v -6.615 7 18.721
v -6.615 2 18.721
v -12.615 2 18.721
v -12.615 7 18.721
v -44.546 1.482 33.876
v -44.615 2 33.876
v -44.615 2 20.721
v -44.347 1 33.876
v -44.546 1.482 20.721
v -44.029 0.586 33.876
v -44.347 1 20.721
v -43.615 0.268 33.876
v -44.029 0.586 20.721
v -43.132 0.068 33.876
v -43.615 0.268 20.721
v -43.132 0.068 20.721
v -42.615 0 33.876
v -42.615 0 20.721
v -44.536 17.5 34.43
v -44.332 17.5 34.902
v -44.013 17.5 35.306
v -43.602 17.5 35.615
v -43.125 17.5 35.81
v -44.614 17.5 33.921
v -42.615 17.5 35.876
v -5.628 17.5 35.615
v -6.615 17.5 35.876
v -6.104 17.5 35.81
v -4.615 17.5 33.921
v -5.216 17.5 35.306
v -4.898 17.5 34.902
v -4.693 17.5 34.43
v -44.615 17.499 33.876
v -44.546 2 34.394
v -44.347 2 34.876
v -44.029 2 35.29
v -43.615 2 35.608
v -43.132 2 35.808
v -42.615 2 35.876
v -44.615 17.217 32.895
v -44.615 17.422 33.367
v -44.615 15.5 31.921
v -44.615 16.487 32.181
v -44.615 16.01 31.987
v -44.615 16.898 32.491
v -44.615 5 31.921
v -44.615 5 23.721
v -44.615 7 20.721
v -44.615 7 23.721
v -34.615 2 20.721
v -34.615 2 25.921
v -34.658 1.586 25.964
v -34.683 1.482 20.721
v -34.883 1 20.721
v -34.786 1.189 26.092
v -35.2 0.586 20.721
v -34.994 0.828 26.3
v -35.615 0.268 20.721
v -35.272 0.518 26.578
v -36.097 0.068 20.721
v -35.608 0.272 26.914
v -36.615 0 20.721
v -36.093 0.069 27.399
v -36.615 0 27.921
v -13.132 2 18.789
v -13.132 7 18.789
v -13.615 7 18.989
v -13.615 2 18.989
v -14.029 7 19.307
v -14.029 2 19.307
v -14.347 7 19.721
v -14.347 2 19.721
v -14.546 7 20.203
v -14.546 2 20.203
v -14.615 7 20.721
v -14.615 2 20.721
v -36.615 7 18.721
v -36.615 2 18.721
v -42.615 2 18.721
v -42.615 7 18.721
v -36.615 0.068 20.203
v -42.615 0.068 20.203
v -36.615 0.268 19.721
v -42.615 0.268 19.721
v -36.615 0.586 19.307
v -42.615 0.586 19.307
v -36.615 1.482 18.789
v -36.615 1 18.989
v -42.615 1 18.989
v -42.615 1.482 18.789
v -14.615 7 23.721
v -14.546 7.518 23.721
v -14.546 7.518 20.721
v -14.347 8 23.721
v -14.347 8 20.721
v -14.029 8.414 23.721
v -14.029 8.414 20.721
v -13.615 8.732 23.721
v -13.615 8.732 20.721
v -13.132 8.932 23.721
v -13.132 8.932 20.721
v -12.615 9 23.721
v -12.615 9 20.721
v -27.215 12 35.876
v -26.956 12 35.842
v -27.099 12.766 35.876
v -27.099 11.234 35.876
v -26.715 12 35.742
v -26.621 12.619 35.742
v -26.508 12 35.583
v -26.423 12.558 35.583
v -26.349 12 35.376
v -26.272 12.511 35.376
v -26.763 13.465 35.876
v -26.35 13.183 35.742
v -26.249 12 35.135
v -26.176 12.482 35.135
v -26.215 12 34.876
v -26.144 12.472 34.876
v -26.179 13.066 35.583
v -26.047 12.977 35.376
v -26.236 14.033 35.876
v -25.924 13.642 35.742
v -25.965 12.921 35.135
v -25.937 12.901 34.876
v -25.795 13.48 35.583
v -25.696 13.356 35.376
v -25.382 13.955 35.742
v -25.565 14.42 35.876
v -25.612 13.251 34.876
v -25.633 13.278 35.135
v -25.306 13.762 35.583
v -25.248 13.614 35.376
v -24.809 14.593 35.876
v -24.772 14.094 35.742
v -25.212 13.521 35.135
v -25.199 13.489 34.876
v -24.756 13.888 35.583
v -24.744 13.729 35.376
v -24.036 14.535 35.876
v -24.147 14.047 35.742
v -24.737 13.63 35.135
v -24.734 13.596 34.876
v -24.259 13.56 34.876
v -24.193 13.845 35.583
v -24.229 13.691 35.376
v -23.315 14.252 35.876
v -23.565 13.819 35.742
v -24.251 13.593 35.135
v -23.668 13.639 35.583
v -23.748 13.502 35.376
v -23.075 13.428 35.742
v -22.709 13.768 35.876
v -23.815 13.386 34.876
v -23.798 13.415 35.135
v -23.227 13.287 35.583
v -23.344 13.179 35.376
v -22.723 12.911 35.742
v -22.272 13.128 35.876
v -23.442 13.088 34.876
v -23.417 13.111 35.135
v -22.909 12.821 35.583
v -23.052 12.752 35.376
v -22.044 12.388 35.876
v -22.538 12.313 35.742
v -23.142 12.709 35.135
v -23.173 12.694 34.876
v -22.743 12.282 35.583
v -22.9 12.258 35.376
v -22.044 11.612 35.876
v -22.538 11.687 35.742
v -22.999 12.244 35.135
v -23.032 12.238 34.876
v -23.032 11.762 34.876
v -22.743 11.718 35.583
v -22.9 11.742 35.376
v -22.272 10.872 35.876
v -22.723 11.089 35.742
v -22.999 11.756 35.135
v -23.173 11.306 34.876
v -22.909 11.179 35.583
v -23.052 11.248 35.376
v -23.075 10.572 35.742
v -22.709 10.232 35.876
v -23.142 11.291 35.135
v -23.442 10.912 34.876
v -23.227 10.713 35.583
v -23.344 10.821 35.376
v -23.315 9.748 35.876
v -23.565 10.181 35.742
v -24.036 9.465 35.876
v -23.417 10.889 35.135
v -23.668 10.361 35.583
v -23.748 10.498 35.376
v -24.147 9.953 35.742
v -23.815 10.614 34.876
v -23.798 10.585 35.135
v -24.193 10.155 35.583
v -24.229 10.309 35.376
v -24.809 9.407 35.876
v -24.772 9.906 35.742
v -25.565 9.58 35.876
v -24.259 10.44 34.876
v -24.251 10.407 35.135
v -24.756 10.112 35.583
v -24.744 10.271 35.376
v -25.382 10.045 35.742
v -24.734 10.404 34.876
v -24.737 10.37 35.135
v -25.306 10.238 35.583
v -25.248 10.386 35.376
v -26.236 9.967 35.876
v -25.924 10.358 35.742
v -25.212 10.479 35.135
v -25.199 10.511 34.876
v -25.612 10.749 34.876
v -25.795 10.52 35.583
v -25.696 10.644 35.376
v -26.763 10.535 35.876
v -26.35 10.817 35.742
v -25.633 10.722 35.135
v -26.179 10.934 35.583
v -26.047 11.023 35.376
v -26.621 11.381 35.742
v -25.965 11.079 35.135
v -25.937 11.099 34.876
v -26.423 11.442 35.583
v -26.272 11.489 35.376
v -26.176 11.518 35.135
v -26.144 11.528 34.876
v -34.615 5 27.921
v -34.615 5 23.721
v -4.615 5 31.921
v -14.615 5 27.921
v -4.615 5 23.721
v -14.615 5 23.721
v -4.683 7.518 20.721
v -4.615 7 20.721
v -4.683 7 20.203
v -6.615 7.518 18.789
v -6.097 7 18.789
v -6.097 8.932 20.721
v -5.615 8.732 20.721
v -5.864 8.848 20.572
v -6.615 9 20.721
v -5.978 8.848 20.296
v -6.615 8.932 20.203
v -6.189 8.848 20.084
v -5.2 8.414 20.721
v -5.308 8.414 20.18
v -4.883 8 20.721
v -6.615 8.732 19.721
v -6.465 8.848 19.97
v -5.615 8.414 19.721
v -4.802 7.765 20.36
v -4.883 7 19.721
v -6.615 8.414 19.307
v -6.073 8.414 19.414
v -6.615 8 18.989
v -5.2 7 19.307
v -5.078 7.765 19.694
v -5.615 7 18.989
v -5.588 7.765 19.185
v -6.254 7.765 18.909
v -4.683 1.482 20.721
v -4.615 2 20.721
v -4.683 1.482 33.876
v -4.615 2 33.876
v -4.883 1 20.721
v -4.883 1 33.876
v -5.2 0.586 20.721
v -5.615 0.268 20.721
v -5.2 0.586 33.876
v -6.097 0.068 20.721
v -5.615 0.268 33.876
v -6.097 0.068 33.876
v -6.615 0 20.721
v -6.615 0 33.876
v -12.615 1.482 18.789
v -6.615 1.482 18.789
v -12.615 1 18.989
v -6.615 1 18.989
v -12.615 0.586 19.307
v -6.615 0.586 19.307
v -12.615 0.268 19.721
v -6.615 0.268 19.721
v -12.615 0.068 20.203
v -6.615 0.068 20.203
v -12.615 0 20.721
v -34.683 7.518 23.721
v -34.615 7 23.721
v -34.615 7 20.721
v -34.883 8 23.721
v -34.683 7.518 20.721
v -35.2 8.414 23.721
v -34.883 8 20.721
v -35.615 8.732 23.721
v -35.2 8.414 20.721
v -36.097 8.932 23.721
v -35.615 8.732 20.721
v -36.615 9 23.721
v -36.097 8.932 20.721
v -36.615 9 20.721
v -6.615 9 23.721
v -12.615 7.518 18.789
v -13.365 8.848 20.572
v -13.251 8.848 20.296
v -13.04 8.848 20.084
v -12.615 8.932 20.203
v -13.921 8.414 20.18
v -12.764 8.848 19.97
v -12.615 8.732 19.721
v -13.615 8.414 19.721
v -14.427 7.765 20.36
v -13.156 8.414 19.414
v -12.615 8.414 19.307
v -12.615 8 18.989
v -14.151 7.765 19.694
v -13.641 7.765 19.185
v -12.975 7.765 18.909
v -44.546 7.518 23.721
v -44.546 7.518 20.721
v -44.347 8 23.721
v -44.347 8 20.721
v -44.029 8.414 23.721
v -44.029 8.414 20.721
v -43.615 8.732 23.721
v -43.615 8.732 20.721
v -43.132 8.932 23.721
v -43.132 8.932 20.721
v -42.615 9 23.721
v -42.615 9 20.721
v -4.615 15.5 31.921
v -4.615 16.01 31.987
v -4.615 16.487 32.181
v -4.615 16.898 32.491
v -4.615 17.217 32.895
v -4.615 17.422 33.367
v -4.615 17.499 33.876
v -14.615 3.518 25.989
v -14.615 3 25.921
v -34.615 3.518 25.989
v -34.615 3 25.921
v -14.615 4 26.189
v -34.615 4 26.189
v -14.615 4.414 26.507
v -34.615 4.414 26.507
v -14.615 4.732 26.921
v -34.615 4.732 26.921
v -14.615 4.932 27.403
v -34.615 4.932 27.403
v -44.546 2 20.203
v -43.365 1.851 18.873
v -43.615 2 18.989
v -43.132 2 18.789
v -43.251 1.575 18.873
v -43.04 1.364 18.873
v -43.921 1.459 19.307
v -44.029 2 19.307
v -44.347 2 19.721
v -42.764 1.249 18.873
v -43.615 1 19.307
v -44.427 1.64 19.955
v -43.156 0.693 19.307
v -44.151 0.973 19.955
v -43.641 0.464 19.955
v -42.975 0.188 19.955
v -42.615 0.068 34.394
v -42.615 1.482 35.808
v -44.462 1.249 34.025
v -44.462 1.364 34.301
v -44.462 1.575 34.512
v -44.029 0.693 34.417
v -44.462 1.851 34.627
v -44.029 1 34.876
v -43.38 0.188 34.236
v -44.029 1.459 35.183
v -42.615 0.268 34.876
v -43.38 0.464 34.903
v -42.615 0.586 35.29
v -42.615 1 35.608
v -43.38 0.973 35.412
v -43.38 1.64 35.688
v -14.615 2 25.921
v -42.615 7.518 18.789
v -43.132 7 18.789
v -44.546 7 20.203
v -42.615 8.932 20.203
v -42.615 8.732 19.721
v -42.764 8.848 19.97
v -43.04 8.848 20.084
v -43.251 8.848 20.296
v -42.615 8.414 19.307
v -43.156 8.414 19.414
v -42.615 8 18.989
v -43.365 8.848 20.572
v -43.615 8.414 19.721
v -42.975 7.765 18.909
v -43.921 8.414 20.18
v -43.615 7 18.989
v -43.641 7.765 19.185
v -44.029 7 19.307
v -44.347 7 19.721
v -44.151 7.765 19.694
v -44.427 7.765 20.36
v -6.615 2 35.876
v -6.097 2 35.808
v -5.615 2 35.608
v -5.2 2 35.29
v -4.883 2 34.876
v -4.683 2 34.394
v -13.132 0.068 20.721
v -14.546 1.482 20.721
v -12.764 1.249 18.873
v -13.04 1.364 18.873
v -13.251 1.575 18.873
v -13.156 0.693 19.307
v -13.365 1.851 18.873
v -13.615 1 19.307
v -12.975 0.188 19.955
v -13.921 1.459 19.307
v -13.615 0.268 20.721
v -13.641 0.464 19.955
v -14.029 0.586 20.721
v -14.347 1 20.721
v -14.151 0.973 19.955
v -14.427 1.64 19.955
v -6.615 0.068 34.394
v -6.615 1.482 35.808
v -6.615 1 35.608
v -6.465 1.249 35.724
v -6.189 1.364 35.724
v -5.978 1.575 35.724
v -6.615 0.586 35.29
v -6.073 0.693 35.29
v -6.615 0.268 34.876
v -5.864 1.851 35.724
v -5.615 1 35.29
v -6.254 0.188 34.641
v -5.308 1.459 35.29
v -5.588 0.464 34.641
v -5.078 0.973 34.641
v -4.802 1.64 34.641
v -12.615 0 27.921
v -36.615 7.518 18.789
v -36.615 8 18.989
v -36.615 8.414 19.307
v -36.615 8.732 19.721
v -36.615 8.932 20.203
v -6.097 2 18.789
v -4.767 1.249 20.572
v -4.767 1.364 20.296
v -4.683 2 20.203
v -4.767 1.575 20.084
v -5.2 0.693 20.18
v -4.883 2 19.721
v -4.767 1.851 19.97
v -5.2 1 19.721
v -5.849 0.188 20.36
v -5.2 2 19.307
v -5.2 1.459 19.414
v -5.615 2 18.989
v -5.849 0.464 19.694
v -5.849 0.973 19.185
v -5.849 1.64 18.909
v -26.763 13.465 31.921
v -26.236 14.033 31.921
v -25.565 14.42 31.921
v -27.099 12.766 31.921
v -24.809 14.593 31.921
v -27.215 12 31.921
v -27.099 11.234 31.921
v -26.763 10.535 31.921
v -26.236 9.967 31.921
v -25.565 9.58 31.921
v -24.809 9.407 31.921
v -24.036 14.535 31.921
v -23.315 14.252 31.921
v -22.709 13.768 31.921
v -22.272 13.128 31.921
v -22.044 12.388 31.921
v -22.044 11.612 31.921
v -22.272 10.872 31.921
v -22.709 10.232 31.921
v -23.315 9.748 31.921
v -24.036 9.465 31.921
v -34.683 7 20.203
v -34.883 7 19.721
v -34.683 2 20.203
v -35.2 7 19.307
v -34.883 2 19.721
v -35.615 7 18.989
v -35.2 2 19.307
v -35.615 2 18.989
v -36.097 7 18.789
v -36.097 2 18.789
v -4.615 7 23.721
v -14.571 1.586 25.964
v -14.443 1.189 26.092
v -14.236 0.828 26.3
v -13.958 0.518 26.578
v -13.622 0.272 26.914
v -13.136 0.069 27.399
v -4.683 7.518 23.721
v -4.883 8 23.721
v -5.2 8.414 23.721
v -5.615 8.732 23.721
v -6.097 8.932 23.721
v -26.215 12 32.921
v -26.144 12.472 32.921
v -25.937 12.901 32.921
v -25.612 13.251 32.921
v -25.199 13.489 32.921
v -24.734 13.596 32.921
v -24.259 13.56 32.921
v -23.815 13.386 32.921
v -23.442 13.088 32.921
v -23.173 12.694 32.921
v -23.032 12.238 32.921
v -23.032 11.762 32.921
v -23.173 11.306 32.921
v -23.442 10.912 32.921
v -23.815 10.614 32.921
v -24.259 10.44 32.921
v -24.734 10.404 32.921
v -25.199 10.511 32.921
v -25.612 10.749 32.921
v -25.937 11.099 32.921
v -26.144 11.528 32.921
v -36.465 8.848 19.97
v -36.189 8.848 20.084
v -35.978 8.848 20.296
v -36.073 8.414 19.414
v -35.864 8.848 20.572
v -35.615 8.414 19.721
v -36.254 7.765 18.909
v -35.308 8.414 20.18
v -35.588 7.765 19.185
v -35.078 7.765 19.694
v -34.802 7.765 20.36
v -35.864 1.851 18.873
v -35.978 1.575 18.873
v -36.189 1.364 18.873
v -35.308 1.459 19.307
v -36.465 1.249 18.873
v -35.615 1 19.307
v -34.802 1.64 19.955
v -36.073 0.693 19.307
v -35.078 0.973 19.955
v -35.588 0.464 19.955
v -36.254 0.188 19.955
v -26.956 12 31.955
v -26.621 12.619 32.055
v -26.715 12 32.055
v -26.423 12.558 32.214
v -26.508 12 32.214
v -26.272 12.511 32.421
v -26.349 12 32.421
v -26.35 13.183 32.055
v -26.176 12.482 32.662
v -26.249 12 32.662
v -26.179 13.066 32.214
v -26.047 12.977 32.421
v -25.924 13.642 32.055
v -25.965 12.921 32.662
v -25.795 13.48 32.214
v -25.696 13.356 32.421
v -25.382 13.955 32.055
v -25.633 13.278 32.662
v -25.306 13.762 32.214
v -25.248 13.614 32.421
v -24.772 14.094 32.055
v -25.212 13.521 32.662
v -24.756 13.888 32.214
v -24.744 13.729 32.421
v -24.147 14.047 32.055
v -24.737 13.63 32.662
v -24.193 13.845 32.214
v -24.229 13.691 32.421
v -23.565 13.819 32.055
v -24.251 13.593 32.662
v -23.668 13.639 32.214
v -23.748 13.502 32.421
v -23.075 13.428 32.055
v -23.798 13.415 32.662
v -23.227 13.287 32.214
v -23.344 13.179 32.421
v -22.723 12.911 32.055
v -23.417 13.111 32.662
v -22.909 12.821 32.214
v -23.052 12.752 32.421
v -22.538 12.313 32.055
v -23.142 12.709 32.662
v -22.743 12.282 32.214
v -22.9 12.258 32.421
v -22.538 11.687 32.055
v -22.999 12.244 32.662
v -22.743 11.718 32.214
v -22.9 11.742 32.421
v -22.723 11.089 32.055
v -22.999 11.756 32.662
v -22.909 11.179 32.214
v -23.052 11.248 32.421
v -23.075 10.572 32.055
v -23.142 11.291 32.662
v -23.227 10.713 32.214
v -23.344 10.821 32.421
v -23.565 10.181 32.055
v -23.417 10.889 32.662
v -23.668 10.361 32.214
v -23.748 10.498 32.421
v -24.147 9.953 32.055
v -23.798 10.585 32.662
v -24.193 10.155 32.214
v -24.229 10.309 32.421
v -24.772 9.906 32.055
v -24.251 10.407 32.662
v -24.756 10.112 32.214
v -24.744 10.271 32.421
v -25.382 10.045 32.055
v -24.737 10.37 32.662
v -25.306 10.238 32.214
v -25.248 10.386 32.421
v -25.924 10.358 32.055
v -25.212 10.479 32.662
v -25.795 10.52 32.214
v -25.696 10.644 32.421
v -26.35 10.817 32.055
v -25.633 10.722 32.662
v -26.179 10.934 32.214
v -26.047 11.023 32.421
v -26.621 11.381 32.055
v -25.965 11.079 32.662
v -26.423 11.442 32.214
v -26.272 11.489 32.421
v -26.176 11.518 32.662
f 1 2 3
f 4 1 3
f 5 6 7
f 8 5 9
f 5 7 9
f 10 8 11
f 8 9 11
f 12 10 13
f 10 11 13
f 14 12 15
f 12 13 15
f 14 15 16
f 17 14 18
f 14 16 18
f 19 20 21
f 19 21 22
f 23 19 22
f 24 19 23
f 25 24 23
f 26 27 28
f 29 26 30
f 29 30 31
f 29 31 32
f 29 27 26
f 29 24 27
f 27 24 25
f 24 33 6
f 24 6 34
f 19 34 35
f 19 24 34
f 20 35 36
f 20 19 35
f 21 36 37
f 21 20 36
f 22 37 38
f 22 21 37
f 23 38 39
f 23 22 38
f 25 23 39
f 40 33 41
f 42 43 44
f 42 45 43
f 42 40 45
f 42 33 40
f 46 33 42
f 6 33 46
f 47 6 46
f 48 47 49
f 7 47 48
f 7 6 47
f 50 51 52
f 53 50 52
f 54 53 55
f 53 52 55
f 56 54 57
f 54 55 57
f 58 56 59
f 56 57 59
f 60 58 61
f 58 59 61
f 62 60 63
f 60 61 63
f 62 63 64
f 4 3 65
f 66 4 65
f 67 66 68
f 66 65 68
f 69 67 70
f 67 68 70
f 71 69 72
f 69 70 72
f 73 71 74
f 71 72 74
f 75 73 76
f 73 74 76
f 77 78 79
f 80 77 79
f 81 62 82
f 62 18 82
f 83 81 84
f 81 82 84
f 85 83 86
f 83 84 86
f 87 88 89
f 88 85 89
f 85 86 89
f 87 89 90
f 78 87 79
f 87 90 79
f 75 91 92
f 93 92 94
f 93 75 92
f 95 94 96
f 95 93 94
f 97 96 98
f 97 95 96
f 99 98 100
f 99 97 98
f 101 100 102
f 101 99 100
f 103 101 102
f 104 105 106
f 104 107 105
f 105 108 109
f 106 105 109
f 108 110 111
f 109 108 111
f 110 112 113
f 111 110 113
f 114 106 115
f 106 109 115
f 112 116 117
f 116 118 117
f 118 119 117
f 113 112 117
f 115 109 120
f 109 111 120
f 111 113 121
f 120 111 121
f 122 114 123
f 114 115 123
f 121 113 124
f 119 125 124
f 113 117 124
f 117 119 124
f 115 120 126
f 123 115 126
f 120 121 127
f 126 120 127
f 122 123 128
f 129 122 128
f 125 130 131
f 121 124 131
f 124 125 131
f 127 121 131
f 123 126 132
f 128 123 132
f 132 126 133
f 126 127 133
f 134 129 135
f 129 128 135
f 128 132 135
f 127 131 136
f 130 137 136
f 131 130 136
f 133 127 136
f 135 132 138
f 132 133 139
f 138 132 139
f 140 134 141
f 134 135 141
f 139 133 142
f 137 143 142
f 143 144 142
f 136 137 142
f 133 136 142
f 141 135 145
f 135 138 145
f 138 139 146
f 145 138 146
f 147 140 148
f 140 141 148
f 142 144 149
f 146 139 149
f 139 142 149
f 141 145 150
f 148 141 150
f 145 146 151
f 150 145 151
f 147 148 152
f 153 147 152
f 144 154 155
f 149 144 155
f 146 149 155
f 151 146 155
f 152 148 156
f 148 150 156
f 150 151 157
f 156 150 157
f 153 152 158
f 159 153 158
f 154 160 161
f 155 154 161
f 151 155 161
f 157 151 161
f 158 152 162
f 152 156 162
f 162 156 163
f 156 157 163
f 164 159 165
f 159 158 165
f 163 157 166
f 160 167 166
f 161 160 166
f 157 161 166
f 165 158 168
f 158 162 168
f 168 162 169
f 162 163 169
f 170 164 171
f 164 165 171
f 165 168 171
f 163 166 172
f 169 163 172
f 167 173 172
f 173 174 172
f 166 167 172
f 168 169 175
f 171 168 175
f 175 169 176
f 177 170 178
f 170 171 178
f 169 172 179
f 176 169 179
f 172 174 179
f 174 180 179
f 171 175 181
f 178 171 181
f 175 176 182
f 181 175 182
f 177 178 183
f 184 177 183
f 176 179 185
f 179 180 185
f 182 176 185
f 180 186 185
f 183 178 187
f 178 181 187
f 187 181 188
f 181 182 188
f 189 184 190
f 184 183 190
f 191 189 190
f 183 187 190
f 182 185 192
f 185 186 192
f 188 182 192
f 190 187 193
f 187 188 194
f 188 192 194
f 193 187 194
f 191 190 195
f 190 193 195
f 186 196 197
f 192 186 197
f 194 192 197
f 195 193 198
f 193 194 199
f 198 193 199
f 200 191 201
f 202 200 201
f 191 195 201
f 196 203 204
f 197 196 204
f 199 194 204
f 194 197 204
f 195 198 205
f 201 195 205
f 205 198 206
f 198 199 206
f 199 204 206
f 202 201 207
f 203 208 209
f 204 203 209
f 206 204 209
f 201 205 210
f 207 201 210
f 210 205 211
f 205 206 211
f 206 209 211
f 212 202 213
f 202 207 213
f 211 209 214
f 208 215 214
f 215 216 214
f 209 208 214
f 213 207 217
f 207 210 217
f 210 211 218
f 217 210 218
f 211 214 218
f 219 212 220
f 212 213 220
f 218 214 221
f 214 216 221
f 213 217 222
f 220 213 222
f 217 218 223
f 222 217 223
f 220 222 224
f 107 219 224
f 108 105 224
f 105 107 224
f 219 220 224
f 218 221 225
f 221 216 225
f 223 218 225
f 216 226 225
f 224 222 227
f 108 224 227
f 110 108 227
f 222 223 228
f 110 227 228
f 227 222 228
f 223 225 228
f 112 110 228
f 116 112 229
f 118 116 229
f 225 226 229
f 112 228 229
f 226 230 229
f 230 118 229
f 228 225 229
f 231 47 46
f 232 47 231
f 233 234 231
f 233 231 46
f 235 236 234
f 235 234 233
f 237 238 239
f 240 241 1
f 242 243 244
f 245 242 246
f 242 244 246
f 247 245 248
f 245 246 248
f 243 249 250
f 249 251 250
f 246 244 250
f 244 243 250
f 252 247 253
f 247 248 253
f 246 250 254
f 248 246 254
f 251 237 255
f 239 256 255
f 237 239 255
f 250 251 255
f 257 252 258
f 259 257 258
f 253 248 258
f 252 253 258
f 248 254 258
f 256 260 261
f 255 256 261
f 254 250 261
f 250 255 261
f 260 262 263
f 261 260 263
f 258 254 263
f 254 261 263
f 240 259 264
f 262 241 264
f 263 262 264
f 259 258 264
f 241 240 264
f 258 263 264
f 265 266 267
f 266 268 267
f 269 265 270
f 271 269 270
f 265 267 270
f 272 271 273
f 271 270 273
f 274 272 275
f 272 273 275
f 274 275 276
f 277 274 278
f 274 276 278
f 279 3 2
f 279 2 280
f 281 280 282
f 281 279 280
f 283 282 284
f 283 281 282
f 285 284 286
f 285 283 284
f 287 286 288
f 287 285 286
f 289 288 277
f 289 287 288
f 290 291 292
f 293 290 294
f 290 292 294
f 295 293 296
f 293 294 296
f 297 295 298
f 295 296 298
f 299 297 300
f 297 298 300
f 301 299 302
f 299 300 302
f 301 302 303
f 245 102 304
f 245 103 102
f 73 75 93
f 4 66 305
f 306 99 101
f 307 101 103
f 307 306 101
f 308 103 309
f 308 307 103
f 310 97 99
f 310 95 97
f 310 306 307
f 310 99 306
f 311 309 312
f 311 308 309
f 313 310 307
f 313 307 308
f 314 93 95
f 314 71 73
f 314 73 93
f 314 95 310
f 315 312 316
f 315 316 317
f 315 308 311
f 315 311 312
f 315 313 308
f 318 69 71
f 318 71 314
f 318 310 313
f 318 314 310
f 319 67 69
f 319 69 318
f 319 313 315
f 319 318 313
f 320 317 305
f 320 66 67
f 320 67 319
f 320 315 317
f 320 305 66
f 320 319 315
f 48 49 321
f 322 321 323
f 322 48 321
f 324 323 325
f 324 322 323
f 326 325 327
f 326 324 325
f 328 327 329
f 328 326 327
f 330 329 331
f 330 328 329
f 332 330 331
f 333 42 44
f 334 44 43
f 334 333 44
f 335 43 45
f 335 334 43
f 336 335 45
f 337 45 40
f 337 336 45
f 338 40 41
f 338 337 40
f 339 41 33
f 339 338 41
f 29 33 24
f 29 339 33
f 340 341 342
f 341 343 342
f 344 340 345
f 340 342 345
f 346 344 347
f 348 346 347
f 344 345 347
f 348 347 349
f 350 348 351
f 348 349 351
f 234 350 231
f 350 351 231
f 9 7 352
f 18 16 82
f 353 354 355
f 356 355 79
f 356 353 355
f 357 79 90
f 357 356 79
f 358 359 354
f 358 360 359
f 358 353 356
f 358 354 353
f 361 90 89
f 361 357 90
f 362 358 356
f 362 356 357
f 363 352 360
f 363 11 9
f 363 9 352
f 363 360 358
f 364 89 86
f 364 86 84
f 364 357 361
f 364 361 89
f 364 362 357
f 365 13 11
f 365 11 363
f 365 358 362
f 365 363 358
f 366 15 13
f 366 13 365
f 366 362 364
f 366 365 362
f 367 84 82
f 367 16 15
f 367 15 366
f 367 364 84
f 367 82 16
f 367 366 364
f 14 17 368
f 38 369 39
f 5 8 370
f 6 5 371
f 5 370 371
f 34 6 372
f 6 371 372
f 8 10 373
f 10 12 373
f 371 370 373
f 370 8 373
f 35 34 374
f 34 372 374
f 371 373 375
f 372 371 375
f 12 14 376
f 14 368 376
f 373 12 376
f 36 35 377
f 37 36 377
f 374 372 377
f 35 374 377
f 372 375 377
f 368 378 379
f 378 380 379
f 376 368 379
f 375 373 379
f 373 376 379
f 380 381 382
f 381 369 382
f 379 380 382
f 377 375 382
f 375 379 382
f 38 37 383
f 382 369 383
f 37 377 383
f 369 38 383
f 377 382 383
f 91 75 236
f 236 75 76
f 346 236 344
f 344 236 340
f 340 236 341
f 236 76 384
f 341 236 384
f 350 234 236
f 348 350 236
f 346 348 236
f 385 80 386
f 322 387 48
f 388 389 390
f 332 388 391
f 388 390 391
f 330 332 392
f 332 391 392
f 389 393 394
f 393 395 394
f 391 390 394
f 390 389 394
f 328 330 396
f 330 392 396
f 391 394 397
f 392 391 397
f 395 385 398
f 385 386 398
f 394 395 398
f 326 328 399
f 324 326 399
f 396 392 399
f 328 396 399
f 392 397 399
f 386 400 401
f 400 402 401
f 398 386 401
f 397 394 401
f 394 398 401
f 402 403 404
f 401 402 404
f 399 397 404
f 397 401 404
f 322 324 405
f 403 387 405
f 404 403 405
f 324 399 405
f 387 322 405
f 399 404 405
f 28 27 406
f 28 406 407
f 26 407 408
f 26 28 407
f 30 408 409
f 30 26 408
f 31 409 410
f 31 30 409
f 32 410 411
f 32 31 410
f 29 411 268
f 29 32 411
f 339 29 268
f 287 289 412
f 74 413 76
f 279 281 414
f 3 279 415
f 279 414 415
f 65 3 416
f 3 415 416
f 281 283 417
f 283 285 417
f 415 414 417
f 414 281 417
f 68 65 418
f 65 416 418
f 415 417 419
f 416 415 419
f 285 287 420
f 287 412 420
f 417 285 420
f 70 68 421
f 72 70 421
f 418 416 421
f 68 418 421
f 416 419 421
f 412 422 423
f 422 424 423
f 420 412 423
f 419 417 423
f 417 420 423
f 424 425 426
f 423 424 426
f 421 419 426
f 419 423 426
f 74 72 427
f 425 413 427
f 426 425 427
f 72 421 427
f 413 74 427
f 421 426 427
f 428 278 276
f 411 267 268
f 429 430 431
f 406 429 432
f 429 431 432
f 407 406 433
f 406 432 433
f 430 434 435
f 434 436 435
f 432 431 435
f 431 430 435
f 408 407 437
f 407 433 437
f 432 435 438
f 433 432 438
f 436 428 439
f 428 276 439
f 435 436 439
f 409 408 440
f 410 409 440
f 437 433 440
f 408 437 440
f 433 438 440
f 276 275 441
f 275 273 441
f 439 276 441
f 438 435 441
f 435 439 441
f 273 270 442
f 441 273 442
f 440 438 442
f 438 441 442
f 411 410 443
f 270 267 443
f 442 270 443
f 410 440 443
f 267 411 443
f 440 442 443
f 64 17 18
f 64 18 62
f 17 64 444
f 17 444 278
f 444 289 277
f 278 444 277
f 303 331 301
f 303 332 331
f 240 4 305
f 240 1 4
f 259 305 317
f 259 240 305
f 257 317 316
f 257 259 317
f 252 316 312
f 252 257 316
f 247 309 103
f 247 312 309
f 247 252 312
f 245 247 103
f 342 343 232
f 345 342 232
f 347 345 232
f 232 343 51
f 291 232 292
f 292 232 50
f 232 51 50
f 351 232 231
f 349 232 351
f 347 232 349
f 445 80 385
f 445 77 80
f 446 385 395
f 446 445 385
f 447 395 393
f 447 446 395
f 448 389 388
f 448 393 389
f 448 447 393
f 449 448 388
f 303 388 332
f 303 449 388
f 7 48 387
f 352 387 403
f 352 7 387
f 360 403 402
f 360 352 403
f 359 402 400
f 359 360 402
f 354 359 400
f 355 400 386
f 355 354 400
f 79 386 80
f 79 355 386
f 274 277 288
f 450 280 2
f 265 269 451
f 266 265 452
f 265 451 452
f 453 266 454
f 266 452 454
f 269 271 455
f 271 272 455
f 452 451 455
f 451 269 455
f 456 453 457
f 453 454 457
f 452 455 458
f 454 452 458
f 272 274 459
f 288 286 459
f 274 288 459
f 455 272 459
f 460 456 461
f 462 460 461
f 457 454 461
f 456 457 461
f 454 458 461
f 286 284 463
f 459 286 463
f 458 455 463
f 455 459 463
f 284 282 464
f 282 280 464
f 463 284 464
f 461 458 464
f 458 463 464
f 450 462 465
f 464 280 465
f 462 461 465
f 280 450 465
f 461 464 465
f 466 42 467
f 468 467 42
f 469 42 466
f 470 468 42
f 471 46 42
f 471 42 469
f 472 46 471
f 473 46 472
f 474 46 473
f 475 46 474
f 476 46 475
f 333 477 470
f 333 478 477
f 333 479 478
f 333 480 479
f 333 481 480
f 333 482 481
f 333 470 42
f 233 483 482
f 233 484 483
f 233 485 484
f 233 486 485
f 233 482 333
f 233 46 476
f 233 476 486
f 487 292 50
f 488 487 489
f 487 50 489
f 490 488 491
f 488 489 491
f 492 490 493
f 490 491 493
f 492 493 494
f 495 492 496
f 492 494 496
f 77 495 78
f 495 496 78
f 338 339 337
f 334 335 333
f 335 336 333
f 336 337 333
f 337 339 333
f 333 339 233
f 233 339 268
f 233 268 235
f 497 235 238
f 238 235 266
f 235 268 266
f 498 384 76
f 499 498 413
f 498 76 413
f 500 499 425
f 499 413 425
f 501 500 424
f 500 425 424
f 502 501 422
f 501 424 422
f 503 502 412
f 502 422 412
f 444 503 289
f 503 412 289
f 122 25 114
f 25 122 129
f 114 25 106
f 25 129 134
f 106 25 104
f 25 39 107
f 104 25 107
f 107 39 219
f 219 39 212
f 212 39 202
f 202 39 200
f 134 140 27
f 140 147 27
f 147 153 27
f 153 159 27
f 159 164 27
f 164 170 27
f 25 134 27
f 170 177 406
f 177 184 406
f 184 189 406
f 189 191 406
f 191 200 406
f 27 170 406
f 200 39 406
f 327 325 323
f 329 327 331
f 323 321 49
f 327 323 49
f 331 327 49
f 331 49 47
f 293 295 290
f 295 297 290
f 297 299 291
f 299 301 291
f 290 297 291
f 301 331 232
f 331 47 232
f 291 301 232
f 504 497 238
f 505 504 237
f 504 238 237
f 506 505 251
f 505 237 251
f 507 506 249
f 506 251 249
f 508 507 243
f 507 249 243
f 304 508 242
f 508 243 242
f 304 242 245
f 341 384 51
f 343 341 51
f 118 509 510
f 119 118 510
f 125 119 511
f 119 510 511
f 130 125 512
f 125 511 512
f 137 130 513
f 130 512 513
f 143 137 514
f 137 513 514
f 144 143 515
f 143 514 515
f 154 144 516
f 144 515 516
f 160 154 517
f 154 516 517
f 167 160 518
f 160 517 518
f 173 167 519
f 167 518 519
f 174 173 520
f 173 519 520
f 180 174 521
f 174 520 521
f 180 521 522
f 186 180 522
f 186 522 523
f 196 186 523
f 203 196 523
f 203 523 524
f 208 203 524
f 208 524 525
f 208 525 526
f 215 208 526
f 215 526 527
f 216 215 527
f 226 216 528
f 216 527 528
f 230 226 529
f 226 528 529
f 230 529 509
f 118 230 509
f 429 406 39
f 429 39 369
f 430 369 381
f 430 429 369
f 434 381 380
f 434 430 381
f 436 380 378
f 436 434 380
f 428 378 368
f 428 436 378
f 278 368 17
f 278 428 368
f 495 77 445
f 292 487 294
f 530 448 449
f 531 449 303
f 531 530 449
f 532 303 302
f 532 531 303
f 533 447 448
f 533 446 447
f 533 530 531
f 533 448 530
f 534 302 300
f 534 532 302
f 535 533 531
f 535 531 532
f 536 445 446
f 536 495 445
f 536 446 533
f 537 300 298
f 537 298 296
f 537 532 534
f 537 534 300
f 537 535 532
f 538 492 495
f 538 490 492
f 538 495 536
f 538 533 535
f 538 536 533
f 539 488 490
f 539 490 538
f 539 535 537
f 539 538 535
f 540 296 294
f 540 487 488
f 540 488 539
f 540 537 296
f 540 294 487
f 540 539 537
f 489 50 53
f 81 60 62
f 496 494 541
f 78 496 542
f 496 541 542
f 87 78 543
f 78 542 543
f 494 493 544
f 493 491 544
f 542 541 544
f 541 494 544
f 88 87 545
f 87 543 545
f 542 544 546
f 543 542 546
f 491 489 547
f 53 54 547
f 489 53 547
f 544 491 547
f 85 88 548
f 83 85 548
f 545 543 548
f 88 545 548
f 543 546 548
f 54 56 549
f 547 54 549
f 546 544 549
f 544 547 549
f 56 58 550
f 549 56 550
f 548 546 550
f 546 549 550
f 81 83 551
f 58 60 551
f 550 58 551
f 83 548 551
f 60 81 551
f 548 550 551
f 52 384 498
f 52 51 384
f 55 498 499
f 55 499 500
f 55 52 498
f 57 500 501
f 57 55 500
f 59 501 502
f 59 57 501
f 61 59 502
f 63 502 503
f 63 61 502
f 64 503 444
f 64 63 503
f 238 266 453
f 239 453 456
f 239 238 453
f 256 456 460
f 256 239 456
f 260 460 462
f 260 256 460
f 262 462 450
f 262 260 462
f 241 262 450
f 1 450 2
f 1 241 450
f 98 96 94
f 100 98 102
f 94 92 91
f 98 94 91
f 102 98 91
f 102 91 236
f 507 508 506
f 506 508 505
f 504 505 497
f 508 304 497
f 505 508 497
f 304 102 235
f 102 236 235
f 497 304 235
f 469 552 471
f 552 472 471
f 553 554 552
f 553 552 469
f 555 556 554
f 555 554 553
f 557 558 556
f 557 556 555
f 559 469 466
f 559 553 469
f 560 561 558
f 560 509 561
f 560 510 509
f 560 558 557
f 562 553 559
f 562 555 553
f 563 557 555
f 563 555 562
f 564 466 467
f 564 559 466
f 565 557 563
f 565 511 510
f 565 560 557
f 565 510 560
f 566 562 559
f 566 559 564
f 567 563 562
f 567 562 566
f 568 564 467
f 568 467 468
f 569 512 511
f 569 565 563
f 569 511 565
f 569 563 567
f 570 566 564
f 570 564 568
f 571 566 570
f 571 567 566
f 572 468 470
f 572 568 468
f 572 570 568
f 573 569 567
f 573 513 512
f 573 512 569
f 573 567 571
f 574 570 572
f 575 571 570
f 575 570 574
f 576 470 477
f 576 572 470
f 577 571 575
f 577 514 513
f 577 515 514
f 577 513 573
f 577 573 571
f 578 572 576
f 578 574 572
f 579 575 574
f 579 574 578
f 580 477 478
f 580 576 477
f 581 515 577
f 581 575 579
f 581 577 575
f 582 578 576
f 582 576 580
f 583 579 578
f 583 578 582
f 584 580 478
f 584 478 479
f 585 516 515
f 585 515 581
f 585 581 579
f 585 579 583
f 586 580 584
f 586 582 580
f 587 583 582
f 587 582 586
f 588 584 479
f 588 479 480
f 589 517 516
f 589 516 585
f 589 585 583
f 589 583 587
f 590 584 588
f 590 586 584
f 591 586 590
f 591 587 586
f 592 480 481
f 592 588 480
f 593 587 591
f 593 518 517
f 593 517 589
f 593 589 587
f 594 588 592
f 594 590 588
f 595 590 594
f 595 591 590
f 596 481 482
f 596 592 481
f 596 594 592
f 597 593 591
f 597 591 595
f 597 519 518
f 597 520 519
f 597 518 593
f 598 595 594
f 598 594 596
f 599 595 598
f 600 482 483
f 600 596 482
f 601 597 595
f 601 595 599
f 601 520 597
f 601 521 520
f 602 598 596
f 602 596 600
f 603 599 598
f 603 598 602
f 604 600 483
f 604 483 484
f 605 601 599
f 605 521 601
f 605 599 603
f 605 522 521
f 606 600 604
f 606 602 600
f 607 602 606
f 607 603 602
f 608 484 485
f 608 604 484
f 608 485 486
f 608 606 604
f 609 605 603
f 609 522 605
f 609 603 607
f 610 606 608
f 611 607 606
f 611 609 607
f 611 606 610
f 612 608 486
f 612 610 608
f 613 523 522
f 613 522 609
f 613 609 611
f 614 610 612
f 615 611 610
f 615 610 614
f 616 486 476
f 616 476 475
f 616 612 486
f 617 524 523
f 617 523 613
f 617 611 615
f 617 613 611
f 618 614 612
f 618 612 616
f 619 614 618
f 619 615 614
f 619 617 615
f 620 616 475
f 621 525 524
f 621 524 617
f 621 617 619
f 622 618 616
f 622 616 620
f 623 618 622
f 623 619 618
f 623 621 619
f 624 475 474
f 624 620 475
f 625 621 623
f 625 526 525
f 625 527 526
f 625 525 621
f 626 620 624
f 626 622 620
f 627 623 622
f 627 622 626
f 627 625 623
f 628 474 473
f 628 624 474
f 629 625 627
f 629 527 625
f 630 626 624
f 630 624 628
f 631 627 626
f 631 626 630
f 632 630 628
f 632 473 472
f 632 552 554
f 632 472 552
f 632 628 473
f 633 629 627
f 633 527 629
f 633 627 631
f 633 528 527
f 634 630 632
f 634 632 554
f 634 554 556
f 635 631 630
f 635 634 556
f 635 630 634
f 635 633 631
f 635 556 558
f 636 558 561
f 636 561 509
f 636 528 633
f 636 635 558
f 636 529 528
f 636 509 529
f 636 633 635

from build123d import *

# Parameters (mm, degrees)
BOSS_EXTRUDE1_DEPTH = 5
SKETCH1_3_W         = 10
SKETCH1_3_H         = 5
BOSS_EXTRUDE2_DEPTH = 9
SKETCH2_W           = 40
SKETCH2_H           = 3.955098896
BOSS_EXTRUDE4_DEPTH = 12.5
FILLET1_R           = 2
SKETCH6_R           = 1.6
CUT_EXTRUDE1_DEPTH  = 3.955098897
FILLET2_R           = 1
FILLET3_R           = 2


with BuildPart() as part:
    # Sketch1 → Boss-Extrude1 (new body)
    with BuildSketch(Plane(origin=(0, 0, 0), x_dir=(1, 0, 0), z_dir=(0, 1, 0))):
        Polygon((-4.61462686, -18.720861087), (-14.61462686, -18.720861087), (-14.61462686, -25.920861087), (-34.61462686, -25.920861087), (-34.61462686, -18.720861087), (-44.61462686, -18.720861087), (-44.61462686, -35.875959983), (-4.61462686, -35.875959983), align=None)
    extrude(amount=BOSS_EXTRUDE1_DEPTH)

    # Sketch1<3> → Boss-Extrude2 (add)
    with BuildSketch(Plane(origin=(0, 0, 0), x_dir=(1, 0, 0), z_dir=(0, 1, 0))):
        with Locations((-39.61462686, -21.220861087)):
            Rectangle(SKETCH1_3_W, SKETCH1_3_H)
        with Locations((-9.61462686, -21.220861087)):
            Rectangle(SKETCH1_3_W, SKETCH1_3_H)
    extrude(amount=BOSS_EXTRUDE2_DEPTH)

    # Sketch2 → Boss-Extrude4 (add)
    with BuildSketch(Plane(origin=(0, 5, 0), x_dir=(1, 0, 0), z_dir=(0, 1, 0))):
        with Locations((-24.61462686, -33.898410535)):
            Rectangle(SKETCH2_W, SKETCH2_H)
    extrude(amount=BOSS_EXTRUDE4_DEPTH)

    # Fillet1
    fillet1_edges = [part.edges().sort_by_distance(p)[0] for p in [
        (-34.61462686, 0, 22.320861087),
        (-24.61462686, 0, 25.920861087),
        (-14.61462686, 0, 22.320861087),
        (-9.61462686, 0, 18.720861087),
        (-4.61462686, 0, 27.298410535),
        (-24.61462686, 0, 35.875959983),
        (-44.61462686, 0, 27.298410535),
        (-44.61462686, 4.5, 18.720861087),
        (-34.61462686, 4.5, 18.720861087),
        (-14.61462686, 4.5, 18.720861087),
        (-4.61462686, 4.5, 18.720861087),
        (-4.61462686, 8.75, 35.875959983),
        (-44.61462686, 8.75, 35.875959983),
        (-24.61462686, 5, 25.920861087),
        (-39.61462686, 9, 18.720861087),
        (-44.61462686, 9, 21.220861087),
        (-34.61462686, 9, 21.220861087),
        (-14.61462686, 9, 21.220861087),
        (-4.61462686, 9, 21.220861087),
        (-9.61462686, 9, 18.720861087),
        (-39.61462686, 0, 18.720861087),
    ]]
    fillet(fillet1_edges, radius=FILLET1_R)

    # Sketch6 → Cut-Extrude1 (cut)
    with BuildSketch(Plane(origin=(0, 0, 31.920861087), x_dir=(-1, 0, 0), z_dir=(0, 0, -1))):
        with Locations((24.61462686, 12)):
            Circle(SKETCH6_R)
    extrude(amount=-CUT_EXTRUDE1_DEPTH, mode=Mode.SUBTRACT)

    # Fillet2
    fillet2_edges = [part.edges().sort_by_distance(p)[0] for p in [
        (-23.01462686, 12, 31.920861087),
        (-23.01462686, 12, 35.875959984),
    ]]
    fillet(fillet2_edges, radius=FILLET2_R)

    # Fillet3
    fillet3_edges = [part.edges().sort_by_distance(p)[0] for p in [
        (-24.61462686, 17.5, 31.920861087),
    ]]
    fillet(fillet3_edges, radius=FILLET3_R)


solid = part.part
